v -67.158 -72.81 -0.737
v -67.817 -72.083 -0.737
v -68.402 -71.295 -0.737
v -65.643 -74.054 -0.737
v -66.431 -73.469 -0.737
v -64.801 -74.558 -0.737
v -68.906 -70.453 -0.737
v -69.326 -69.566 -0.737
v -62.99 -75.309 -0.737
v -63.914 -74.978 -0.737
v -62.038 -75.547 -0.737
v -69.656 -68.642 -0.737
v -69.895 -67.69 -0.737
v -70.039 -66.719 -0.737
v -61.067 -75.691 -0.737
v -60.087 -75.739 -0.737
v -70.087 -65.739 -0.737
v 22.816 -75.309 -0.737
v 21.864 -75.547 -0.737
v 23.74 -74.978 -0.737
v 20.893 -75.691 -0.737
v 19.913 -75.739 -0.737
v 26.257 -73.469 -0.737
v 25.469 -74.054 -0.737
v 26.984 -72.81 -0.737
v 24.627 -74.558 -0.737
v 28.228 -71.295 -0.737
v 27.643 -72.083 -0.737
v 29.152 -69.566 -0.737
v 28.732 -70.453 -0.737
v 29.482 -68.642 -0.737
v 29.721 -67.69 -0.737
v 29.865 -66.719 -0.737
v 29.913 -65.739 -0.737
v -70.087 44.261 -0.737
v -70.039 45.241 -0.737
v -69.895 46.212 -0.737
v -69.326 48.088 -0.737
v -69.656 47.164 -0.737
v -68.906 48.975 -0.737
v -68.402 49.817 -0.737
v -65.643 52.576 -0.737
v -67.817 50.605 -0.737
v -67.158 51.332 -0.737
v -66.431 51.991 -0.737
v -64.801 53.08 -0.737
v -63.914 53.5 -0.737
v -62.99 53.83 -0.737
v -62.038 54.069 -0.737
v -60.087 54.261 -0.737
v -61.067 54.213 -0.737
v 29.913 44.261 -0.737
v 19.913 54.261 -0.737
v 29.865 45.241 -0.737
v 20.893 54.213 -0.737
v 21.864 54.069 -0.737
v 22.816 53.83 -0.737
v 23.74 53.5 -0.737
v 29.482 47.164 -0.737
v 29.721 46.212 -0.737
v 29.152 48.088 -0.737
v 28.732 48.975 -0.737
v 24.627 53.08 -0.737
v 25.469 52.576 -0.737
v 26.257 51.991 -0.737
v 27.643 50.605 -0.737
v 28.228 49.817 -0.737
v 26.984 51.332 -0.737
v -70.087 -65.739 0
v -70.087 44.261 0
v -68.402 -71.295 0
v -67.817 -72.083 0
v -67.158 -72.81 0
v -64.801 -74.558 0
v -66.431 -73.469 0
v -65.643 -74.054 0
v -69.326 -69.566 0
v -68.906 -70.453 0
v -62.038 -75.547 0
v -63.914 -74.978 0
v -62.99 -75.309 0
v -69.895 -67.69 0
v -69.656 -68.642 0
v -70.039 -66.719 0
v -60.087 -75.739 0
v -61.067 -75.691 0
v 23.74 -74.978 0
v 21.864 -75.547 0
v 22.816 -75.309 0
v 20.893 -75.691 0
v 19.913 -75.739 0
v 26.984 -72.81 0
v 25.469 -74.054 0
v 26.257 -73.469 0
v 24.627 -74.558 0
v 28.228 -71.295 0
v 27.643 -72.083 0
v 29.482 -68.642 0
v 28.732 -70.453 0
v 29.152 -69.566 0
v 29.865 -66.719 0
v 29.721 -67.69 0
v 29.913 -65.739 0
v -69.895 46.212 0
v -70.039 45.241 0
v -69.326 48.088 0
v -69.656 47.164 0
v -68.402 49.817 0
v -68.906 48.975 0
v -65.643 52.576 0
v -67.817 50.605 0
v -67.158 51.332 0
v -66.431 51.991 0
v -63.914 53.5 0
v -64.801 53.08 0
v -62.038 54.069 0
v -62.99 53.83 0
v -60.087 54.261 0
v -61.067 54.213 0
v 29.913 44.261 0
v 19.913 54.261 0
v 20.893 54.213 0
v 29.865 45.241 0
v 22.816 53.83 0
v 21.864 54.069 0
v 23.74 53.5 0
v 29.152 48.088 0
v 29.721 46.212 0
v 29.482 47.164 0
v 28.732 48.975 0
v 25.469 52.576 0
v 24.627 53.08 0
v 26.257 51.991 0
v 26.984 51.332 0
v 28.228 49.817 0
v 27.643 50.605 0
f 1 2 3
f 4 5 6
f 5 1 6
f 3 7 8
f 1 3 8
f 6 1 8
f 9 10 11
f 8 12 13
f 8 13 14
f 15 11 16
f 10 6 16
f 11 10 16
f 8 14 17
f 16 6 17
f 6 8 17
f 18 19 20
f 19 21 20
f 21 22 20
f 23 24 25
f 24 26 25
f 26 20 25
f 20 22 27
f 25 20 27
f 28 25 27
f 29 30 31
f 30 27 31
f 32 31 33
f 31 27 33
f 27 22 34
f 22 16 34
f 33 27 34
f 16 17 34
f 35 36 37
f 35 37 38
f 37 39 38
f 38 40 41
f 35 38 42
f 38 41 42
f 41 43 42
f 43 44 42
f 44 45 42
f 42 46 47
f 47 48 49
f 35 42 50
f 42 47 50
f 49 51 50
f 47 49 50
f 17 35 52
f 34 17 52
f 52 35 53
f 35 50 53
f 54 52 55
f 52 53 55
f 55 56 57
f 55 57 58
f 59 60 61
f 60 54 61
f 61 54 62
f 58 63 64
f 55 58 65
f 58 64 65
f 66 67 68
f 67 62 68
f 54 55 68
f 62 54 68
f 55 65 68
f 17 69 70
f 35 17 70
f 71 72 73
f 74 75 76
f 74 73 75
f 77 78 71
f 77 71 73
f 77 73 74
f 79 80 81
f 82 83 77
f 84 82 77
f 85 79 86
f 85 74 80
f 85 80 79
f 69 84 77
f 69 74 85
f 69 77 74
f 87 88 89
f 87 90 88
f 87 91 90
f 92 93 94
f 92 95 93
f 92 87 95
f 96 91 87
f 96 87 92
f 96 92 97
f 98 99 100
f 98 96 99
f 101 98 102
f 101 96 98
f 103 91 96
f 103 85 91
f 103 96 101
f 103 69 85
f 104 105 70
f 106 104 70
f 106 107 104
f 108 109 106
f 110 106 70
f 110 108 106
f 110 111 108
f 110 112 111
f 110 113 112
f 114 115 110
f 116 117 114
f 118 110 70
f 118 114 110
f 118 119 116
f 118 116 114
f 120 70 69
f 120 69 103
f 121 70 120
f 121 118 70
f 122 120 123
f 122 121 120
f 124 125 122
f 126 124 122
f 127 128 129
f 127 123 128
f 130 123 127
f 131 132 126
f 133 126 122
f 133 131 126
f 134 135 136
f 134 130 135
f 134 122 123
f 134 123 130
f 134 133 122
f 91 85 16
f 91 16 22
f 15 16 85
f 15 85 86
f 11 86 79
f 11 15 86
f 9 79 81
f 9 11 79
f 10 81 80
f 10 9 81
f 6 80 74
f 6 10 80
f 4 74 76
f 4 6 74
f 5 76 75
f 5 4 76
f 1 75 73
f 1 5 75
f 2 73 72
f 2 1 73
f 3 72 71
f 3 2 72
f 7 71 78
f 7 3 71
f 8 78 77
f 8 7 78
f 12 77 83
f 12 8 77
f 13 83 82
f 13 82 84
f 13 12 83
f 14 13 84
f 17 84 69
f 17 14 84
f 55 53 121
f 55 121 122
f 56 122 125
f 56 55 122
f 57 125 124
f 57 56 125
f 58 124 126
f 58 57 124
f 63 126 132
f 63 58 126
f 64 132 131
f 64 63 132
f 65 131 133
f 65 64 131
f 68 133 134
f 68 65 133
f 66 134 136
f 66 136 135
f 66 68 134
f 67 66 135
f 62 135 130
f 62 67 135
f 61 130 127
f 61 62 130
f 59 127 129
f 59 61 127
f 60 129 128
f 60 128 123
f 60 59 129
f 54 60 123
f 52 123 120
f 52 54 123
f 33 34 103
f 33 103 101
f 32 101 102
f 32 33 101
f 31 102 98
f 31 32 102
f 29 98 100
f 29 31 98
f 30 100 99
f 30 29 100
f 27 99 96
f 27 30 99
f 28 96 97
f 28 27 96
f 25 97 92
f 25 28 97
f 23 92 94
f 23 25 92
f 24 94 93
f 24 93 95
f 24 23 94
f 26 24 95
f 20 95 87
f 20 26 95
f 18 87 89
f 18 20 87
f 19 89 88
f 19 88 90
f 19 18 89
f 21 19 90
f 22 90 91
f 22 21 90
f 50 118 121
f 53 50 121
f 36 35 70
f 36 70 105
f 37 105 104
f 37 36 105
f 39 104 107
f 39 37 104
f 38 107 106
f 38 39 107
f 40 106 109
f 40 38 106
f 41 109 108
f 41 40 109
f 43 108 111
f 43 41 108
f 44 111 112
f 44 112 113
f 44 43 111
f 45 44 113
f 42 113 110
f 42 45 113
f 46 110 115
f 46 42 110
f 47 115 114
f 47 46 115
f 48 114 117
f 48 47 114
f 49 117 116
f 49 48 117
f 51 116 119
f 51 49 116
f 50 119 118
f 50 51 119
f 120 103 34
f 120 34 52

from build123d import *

# Parameters (mm, degrees)
SKETCH2_W           = 100
SKETCH2_H           = 130
BASE_FLANGE1_DEPTH  = 0.7366
BREAK_CORNER1_START = -0.7366
BREAK_CORNER1_DEPTH = 0.7366


# Read off the part's stored shape, not the designer's step: Break-Corner1
# Sheet-metal steps are written as plain solids
with BuildPart() as part:
    # Sketch2 → Base-Flange1 (new body)
    with BuildSketch(Plane.XY):
        with Locations((-20.086956522, -10.739130435)):
            Rectangle(SKETCH2_W, SKETCH2_H)
    extrude(amount=-BASE_FLANGE1_DEPTH)

    # Break-Corner1 outline → Break-Corner1 (cut)
    with BuildSketch(Plane.XY.offset(BREAK_CORNER1_START)):
        with BuildLine():
            ThreePointArc((-70.086956522, 44.260869565), (-67.158024334, 51.331937377), (-60.086956522, 54.260869565))
            Line((-60.086956522, 54.260869565), (-70.086956522, 54.260869565))
            Line((-70.086956522, 54.260869565), (-70.086956522, 44.260869565))
        make_face()
        with BuildLine():
            Line((29.913043478, 54.260869565), (19.913043478, 54.260869565))
            ThreePointArc((19.913043478, 54.260869565), (26.98411129, 51.331937377), (29.913043478, 44.260869565))
            Line((29.913043478, 44.260869565), (29.913043478, 54.260869565))
        make_face()
        with BuildLine():
            ThreePointArc((-60.086956522, -75.739130435), (-67.158024334, -72.810198247), (-70.086956522, -65.739130435))
            Line((-70.086956522, -65.739130435), (-70.086956522, -75.739130435))
            Line((-70.086956522, -75.739130435), (-60.086956522, -75.739130435))
        make_face()
        with BuildLine():
            Line((29.913043478, -75.739130435), (29.913043478, -65.739130435))
            ThreePointArc((29.913043478, -65.739130435), (26.98411129, -72.810198247), (19.913043478, -75.739130435))
            Line((19.913043478, -75.739130435), (29.913043478, -75.739130435))
        make_face()
    extrude(amount=BREAK_CORNER1_DEPTH, mode=Mode.SUBTRACT)


solid = part.part
